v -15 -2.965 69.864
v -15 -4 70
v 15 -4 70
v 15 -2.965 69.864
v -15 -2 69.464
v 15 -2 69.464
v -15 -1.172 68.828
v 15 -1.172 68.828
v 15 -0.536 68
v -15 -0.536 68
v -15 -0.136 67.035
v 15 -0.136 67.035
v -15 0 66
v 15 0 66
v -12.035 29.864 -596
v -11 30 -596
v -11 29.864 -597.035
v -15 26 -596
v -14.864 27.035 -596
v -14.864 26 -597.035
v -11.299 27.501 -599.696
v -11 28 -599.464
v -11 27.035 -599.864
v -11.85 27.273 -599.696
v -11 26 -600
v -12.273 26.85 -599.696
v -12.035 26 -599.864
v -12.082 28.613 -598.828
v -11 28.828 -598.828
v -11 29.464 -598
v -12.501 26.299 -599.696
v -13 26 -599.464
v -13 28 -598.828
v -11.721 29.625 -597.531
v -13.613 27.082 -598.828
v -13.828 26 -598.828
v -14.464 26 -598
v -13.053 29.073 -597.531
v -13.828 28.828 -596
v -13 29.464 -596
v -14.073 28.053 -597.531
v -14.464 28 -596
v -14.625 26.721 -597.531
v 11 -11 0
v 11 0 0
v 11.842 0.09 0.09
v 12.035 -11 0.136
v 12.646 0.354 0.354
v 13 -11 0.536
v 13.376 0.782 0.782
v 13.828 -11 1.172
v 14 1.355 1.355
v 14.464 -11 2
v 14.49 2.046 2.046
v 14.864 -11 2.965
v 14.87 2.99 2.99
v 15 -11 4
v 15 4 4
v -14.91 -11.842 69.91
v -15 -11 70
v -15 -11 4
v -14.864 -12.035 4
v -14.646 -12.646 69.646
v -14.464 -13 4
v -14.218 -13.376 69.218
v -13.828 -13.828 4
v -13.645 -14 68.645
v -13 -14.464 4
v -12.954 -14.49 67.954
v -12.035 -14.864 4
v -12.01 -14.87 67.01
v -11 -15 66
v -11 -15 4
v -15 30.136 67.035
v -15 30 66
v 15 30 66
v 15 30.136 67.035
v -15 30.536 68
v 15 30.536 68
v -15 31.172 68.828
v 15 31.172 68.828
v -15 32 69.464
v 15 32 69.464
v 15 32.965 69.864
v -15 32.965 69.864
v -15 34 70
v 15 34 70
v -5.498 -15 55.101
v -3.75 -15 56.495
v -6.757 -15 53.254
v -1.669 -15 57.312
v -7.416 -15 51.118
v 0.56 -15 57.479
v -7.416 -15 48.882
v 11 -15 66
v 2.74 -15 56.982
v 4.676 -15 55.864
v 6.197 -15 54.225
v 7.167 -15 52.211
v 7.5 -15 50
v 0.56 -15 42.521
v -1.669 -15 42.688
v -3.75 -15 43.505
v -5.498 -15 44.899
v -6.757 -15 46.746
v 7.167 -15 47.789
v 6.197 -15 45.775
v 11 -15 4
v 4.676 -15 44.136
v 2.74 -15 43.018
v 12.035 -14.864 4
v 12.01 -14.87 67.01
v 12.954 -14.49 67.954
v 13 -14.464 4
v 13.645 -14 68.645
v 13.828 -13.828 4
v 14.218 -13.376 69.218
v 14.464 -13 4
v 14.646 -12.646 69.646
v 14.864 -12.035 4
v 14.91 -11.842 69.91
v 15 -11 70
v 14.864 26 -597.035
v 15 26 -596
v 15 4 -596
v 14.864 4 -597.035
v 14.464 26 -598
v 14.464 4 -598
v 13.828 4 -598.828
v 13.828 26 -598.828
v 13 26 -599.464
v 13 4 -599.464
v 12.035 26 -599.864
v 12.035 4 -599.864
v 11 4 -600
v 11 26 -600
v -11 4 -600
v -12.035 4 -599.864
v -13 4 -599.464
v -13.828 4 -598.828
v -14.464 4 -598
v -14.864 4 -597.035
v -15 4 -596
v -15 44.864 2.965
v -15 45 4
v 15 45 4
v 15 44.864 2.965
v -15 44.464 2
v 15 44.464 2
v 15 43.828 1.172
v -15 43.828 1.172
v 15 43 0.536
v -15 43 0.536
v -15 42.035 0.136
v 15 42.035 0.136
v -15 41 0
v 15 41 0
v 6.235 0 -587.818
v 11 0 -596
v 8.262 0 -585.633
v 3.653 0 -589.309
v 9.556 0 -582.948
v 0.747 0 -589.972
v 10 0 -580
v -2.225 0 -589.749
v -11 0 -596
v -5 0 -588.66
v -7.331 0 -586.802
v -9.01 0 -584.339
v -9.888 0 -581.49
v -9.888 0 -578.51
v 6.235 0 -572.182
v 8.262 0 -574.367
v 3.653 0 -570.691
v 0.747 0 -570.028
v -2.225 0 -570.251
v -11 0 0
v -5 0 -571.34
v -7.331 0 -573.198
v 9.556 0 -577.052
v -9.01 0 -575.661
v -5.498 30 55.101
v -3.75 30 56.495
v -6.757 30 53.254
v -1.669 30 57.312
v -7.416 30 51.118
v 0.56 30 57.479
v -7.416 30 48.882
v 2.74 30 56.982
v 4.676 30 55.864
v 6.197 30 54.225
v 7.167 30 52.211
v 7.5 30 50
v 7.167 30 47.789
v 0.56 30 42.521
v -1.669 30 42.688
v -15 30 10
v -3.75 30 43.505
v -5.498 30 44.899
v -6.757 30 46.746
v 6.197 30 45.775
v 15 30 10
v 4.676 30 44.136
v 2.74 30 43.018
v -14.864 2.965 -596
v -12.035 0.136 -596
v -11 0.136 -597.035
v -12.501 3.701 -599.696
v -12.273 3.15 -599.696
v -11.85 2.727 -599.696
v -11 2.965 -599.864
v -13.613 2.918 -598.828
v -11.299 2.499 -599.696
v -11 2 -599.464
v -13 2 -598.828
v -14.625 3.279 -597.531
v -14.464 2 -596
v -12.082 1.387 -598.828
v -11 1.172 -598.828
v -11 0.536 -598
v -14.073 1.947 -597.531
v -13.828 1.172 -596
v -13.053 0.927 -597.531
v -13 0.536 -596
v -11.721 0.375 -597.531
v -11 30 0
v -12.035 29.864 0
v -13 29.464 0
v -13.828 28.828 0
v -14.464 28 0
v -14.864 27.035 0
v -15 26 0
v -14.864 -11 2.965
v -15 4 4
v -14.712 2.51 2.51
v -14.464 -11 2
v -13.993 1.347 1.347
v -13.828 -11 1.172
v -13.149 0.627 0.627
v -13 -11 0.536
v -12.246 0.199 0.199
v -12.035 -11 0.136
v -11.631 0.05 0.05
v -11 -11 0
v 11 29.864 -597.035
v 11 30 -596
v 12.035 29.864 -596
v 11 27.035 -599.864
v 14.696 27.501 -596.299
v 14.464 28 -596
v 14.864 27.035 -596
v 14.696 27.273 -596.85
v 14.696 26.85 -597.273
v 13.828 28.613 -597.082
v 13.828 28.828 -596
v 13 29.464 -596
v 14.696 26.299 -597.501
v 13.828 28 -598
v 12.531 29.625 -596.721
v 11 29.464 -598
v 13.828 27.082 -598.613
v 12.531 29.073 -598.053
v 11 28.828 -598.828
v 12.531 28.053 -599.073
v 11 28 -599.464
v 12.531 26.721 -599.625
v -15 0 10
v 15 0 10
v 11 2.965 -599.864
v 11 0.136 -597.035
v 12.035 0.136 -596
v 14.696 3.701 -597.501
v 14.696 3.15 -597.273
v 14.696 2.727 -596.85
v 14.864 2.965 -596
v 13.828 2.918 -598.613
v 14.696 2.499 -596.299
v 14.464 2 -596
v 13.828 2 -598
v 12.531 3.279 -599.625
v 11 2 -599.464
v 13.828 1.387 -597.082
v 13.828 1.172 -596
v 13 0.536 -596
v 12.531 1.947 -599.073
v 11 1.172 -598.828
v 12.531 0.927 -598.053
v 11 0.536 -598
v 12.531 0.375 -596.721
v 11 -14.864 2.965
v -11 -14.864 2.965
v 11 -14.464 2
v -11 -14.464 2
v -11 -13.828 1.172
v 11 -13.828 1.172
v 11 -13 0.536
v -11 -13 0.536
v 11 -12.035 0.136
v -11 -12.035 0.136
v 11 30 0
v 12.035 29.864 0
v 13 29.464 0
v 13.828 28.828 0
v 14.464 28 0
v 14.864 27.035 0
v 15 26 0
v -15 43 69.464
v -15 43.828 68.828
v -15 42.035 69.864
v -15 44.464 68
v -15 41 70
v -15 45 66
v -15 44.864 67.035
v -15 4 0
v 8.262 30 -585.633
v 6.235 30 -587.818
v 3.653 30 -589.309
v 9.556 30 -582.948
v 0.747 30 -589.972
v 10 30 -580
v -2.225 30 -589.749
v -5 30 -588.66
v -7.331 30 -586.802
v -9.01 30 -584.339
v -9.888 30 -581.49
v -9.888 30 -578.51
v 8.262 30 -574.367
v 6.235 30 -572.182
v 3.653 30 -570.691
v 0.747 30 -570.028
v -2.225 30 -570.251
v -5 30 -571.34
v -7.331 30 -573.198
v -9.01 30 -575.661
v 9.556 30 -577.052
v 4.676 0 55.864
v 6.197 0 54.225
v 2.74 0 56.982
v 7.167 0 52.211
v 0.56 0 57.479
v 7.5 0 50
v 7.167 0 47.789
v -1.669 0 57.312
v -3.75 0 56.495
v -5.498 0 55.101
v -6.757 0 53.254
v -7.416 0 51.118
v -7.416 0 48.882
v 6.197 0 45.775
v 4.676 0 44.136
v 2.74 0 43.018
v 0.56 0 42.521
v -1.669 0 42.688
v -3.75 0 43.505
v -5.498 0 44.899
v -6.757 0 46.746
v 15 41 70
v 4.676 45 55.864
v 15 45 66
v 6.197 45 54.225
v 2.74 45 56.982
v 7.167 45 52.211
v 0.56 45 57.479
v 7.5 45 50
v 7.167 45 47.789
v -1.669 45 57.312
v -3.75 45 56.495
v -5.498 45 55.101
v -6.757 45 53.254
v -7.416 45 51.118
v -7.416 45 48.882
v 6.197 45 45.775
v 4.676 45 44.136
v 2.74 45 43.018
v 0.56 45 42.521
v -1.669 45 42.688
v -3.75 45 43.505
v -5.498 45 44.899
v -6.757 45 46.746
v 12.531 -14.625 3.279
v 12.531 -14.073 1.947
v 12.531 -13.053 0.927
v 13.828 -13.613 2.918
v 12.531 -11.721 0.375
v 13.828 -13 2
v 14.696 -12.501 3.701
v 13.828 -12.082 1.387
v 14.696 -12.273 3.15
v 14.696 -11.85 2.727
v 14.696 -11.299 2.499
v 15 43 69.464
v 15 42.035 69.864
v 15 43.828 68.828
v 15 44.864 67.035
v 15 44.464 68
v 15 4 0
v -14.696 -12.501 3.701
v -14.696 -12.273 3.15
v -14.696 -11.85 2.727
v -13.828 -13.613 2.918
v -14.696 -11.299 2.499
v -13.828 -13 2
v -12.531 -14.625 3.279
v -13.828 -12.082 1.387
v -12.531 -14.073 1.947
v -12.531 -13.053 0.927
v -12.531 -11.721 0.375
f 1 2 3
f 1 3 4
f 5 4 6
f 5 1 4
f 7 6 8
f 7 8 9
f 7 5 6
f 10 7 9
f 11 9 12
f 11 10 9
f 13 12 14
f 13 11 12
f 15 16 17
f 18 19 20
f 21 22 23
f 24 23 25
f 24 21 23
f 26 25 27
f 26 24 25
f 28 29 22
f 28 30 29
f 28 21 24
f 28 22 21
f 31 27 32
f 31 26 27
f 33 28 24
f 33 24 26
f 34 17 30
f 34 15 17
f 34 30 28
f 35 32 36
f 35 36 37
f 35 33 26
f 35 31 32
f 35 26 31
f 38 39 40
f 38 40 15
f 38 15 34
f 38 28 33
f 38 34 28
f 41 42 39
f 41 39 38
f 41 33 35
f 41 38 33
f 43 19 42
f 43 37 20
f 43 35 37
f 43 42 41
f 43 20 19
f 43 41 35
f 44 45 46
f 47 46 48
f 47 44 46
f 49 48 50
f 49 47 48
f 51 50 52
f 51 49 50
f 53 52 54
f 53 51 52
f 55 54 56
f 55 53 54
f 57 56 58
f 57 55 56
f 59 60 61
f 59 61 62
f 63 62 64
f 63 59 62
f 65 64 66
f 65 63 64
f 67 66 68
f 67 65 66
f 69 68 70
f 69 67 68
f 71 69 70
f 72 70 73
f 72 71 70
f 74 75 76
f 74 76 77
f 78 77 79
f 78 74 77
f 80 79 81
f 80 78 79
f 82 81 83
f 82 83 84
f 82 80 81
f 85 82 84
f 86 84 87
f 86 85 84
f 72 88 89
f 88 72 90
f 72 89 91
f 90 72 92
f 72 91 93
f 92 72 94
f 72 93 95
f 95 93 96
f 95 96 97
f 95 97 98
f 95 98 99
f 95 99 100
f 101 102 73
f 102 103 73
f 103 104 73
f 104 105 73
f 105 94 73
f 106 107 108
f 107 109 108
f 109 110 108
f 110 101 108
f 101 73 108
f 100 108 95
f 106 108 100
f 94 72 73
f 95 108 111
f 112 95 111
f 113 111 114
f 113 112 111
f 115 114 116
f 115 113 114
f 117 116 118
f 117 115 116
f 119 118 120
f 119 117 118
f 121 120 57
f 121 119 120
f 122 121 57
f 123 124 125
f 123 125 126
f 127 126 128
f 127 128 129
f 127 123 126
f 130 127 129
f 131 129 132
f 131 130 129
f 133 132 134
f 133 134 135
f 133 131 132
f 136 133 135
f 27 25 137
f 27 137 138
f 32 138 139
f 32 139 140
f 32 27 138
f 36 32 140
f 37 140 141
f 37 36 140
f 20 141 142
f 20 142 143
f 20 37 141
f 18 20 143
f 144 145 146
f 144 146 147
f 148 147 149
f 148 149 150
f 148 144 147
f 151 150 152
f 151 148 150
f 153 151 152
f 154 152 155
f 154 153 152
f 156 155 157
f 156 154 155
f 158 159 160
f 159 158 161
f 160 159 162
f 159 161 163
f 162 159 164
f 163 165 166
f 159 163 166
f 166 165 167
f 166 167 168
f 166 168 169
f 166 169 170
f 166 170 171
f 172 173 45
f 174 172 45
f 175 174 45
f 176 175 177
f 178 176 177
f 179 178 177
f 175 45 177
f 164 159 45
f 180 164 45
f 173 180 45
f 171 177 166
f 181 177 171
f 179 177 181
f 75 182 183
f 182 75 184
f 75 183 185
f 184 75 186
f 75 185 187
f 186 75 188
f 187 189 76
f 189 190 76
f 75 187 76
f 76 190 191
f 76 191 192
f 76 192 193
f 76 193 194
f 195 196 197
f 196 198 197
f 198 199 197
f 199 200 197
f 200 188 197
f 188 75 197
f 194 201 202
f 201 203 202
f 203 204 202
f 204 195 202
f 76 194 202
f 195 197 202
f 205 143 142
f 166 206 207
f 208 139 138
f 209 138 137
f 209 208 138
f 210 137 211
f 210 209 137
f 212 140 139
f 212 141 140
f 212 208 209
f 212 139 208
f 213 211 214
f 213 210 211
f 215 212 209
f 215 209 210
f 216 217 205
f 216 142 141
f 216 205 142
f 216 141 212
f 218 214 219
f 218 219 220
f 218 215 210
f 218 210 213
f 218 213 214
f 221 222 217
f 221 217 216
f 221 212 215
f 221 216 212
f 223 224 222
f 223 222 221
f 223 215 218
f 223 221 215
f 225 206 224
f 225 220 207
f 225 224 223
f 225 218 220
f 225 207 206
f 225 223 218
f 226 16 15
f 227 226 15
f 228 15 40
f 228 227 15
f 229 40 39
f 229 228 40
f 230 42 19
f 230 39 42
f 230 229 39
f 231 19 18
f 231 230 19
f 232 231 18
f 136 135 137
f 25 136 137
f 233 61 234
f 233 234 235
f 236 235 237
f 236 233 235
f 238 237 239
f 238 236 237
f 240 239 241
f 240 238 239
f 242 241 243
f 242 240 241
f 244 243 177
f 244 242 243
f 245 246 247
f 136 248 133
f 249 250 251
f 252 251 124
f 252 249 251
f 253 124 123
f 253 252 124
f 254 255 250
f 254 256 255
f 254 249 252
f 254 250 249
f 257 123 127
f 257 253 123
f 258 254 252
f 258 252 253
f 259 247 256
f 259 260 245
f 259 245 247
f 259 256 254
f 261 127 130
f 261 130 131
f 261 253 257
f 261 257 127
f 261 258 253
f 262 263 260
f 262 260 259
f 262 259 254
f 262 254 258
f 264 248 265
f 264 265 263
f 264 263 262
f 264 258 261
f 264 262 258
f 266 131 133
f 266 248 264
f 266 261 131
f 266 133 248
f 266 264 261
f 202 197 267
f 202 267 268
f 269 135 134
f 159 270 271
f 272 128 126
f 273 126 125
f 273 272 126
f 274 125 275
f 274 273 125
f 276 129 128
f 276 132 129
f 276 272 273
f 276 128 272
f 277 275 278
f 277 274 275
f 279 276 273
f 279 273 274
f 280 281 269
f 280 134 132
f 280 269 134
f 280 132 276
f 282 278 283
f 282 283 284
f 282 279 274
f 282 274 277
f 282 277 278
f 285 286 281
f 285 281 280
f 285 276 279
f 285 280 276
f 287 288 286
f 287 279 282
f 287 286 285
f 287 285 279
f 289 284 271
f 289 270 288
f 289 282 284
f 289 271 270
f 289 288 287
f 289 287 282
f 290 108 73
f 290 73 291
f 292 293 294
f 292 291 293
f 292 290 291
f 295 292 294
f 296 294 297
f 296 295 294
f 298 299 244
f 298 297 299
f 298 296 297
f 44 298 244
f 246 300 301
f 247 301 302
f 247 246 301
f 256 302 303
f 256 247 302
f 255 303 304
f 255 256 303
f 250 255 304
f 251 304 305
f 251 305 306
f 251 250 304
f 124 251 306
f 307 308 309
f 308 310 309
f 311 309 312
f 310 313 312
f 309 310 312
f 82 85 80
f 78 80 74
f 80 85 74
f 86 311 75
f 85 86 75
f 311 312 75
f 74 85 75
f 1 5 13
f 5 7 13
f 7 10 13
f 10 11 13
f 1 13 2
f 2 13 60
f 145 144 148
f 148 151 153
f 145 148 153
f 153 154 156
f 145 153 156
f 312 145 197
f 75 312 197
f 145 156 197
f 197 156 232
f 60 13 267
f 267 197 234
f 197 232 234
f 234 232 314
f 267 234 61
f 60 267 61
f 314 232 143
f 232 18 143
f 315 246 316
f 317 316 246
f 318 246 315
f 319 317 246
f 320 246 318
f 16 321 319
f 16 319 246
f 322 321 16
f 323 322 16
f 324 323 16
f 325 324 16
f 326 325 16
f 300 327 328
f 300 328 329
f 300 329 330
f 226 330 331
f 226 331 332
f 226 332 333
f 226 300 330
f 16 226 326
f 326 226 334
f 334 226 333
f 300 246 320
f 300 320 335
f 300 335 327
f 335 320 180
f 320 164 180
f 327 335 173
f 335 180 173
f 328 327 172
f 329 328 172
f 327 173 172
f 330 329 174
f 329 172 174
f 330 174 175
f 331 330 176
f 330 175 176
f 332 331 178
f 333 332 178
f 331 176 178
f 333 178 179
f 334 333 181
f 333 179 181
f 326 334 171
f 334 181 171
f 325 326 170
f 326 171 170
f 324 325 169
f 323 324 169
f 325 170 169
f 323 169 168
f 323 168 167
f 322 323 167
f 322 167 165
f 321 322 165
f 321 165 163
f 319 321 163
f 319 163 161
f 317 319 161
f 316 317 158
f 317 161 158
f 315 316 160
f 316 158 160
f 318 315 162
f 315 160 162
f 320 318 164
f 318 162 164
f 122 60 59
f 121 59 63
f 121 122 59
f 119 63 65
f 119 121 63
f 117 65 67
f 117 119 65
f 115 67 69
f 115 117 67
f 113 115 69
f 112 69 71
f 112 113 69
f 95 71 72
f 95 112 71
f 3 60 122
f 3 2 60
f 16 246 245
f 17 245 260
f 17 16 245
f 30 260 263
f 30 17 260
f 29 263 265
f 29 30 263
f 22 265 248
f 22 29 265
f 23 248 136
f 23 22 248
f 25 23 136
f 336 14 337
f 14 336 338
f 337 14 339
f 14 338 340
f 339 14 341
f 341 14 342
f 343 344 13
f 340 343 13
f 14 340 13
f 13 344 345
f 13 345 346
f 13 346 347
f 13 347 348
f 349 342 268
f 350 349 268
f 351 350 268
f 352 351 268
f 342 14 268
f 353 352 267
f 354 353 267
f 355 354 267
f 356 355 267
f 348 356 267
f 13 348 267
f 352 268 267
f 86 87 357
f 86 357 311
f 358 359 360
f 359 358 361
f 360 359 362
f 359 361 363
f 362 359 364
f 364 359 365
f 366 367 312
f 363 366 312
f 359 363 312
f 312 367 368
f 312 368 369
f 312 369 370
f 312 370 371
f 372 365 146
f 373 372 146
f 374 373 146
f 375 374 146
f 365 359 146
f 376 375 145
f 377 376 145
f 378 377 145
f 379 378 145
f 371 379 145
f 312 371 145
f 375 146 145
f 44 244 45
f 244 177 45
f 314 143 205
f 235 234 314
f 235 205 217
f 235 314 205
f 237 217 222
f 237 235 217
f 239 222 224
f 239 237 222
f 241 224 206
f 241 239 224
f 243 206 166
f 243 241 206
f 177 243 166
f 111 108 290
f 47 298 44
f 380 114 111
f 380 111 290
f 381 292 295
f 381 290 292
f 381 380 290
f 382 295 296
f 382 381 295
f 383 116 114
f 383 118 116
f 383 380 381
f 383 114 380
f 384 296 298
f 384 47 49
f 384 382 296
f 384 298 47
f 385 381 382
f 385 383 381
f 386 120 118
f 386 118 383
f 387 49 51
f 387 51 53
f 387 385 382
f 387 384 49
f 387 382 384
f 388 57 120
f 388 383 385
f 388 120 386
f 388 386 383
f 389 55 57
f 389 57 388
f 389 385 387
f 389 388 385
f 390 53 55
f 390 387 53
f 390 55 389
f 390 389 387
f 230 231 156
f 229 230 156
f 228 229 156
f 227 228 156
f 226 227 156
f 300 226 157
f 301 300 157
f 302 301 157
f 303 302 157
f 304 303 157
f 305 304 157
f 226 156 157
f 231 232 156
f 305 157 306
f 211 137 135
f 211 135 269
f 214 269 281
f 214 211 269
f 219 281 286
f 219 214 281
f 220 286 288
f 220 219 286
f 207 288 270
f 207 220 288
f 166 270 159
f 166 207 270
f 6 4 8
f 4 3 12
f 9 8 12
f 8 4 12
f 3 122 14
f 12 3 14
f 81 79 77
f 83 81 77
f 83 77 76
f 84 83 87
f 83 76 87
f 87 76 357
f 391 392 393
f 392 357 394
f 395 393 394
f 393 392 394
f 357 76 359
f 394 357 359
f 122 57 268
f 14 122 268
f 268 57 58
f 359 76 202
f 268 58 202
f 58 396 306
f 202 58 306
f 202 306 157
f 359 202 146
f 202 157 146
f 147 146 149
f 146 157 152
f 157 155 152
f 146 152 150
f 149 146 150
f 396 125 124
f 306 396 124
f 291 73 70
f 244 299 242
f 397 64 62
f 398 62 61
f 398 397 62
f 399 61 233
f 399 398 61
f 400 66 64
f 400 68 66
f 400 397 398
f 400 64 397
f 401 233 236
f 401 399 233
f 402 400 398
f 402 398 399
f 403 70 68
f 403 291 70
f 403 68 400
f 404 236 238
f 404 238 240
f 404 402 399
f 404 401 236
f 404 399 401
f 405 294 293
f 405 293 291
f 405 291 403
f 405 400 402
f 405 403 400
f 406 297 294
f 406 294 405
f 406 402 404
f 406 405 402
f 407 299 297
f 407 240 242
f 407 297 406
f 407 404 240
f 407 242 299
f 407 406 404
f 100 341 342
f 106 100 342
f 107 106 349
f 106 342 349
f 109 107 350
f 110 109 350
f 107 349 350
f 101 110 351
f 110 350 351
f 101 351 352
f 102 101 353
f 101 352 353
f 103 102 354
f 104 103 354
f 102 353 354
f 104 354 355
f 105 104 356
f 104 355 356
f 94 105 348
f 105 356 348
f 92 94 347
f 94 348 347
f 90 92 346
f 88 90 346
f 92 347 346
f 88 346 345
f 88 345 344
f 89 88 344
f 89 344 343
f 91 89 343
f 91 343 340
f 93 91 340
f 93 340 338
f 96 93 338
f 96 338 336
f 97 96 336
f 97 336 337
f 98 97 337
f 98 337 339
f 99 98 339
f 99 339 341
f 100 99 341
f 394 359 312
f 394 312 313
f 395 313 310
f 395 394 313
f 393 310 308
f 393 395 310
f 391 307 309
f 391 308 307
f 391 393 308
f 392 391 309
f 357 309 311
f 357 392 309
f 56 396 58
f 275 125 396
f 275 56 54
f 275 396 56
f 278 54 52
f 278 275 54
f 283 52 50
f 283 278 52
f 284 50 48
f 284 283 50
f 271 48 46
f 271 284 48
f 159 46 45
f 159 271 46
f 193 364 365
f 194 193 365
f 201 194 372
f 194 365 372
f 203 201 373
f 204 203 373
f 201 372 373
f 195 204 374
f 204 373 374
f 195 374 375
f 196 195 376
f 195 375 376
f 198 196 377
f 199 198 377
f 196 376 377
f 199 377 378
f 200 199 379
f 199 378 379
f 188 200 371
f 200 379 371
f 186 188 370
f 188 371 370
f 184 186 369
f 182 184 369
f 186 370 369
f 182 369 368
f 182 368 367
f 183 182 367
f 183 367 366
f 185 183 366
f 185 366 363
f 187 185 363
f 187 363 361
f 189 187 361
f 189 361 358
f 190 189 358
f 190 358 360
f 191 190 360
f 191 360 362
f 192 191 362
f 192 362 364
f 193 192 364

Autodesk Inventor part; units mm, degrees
ref_plane "YZ Plane" through (0, 0, 0) normal (1, 0, 0) x (0, 1, 0)
ref_plane "XY Plane" through (0, 0, 0) normal (0, 0, 1) x (1, 0, 0)
sketch "Szkic1" plane through (0, 0, 0) normal (0, 1, 0) x (-1, 0, 0)
  line L0 (15, 0) -> (-15, 0)
  line L1 (-15, 0) -> (-15, -600)
  line L2 (-15, -600) -> (15, -600)
  line L3 (15, -600) -> (15, 0)
  point P0 (0, 0)
  point P1 (0, 0)
  dimension "d0" = 30
  dimension "d1" = 600
extrude "Wyciągnięcie proste1" add sketch "Szkic1" along normal blind 30
sketch "Szkic2" plane through (-15, 0, 0) normal (0, 0, 1) x (1, 0, 0)
  line L0 (0, 0) -> (0, 30) projected
  line L1 (0, 0) -> (30, 0) projected
  line L2 (30, 0) -> (30, 30) projected
  line L3 (0, 30) -> (30, 30) projected
  line L4 (0, 0) -> (0, 30) projected
  line L5 (0, -15) -> (30, -15)
  line L6 (30, -15) -> (30, 45)
  line L7 (30, 45) -> (0, 45)
  line L8 (0, 45) -> (0, -15)
  point P0 (15, 0)
  point P1 (0, 15)
  point P2 (0, 15)
  dimension "d4" = 60
  dimension "d5" = 30
extrude "Wyciągnięcie proste2" add sketch "Szkic2" along normal blind 10
sketch "Szkic3" plane through (-15, 0, 10) normal (0, 0, 1) x (1, 0, 0)
  line L0 (0, -15) -> (30, -15) projected
  line L1 (30, -15) -> (30, 45) projected
  line L2 (0, -15) -> (30, -15)
  line L3 (30, -15) -> (30, 0)
  line L4 (30, 0) -> (0, 0)
  line L5 (0, 0) -> (0, -15)
  point P0 (15, 0)
extrude "Wyciągnięcie proste3" add sketch "Szkic3" along normal blind 60
ref_plane "Płaszczyzna konstrukcyjna1" through (0, 15, 0) normal (0, 1, 0) x (-1, 0, 0)
mirror "Odbicie lustrzane1" about plane through (0, 15, 0) normal (0, 1, 0) of "Wyciągnięcie proste3"
sketch "Szkic4" plane through (0, 15, 0) normal (0, 1, 0) x (-1, 0, 0)
  point P0 (0, 0)
sketch "Szkic5" plane through (-15, 45, 0) normal (0, 1, 0) x (1, 0, 0)
  line L0 (0, -70) -> (30, -70) projected
  line L1 (30, 0) -> (30, -70) projected
  circle A0 centre (15, -50) radius 7.5
  point P0 (15, 0)
  dimension "d11" = 15
  dimension "d12" = 20
  dimension "d13" = 15
extrude "Wyciągnięcie proste4" cut sketch "Szkic5" against normal through all
fillet "Zaokrąglenie1" radius 4 12 edges at (0, 45, 0) (0, 45, 70) (0, 0, 70) (-15, 0, -300) (-15, 30, -300) (-15, 15, -600) (0, 0, -600) (0, 30, -600) (15, 15, -600) (15, 0, -300) (15, 30, -300) (0, -15, 0)
sketch "Szkic6" plane through (0, 0, 0) normal (0, -1, 0) x (1, 0, 0)
  circle A0 centre (0, -580) radius 10
  line L0 (-11, -600) -> (11, -600) projected
  line L1 (-15, 0) -> (-15, -596) projected
  point P0 (0, 0)
  dimension "d17" = 20
  dimension "d18" = 20
  dimension "d19" = 15
extrude "Wyciągnięcie proste5" cut sketch "Szkic6" against normal through all
fillet "Zaokrąglenie2" radius 4 3 edges at (0, -15, 70) (15, -3.5, 0) (-15, -3.5, 0)
fillet "Zaokrąglenie3" radius 4 1 edges at (0, 30, 70)
properties part number "2" material "Złote"
